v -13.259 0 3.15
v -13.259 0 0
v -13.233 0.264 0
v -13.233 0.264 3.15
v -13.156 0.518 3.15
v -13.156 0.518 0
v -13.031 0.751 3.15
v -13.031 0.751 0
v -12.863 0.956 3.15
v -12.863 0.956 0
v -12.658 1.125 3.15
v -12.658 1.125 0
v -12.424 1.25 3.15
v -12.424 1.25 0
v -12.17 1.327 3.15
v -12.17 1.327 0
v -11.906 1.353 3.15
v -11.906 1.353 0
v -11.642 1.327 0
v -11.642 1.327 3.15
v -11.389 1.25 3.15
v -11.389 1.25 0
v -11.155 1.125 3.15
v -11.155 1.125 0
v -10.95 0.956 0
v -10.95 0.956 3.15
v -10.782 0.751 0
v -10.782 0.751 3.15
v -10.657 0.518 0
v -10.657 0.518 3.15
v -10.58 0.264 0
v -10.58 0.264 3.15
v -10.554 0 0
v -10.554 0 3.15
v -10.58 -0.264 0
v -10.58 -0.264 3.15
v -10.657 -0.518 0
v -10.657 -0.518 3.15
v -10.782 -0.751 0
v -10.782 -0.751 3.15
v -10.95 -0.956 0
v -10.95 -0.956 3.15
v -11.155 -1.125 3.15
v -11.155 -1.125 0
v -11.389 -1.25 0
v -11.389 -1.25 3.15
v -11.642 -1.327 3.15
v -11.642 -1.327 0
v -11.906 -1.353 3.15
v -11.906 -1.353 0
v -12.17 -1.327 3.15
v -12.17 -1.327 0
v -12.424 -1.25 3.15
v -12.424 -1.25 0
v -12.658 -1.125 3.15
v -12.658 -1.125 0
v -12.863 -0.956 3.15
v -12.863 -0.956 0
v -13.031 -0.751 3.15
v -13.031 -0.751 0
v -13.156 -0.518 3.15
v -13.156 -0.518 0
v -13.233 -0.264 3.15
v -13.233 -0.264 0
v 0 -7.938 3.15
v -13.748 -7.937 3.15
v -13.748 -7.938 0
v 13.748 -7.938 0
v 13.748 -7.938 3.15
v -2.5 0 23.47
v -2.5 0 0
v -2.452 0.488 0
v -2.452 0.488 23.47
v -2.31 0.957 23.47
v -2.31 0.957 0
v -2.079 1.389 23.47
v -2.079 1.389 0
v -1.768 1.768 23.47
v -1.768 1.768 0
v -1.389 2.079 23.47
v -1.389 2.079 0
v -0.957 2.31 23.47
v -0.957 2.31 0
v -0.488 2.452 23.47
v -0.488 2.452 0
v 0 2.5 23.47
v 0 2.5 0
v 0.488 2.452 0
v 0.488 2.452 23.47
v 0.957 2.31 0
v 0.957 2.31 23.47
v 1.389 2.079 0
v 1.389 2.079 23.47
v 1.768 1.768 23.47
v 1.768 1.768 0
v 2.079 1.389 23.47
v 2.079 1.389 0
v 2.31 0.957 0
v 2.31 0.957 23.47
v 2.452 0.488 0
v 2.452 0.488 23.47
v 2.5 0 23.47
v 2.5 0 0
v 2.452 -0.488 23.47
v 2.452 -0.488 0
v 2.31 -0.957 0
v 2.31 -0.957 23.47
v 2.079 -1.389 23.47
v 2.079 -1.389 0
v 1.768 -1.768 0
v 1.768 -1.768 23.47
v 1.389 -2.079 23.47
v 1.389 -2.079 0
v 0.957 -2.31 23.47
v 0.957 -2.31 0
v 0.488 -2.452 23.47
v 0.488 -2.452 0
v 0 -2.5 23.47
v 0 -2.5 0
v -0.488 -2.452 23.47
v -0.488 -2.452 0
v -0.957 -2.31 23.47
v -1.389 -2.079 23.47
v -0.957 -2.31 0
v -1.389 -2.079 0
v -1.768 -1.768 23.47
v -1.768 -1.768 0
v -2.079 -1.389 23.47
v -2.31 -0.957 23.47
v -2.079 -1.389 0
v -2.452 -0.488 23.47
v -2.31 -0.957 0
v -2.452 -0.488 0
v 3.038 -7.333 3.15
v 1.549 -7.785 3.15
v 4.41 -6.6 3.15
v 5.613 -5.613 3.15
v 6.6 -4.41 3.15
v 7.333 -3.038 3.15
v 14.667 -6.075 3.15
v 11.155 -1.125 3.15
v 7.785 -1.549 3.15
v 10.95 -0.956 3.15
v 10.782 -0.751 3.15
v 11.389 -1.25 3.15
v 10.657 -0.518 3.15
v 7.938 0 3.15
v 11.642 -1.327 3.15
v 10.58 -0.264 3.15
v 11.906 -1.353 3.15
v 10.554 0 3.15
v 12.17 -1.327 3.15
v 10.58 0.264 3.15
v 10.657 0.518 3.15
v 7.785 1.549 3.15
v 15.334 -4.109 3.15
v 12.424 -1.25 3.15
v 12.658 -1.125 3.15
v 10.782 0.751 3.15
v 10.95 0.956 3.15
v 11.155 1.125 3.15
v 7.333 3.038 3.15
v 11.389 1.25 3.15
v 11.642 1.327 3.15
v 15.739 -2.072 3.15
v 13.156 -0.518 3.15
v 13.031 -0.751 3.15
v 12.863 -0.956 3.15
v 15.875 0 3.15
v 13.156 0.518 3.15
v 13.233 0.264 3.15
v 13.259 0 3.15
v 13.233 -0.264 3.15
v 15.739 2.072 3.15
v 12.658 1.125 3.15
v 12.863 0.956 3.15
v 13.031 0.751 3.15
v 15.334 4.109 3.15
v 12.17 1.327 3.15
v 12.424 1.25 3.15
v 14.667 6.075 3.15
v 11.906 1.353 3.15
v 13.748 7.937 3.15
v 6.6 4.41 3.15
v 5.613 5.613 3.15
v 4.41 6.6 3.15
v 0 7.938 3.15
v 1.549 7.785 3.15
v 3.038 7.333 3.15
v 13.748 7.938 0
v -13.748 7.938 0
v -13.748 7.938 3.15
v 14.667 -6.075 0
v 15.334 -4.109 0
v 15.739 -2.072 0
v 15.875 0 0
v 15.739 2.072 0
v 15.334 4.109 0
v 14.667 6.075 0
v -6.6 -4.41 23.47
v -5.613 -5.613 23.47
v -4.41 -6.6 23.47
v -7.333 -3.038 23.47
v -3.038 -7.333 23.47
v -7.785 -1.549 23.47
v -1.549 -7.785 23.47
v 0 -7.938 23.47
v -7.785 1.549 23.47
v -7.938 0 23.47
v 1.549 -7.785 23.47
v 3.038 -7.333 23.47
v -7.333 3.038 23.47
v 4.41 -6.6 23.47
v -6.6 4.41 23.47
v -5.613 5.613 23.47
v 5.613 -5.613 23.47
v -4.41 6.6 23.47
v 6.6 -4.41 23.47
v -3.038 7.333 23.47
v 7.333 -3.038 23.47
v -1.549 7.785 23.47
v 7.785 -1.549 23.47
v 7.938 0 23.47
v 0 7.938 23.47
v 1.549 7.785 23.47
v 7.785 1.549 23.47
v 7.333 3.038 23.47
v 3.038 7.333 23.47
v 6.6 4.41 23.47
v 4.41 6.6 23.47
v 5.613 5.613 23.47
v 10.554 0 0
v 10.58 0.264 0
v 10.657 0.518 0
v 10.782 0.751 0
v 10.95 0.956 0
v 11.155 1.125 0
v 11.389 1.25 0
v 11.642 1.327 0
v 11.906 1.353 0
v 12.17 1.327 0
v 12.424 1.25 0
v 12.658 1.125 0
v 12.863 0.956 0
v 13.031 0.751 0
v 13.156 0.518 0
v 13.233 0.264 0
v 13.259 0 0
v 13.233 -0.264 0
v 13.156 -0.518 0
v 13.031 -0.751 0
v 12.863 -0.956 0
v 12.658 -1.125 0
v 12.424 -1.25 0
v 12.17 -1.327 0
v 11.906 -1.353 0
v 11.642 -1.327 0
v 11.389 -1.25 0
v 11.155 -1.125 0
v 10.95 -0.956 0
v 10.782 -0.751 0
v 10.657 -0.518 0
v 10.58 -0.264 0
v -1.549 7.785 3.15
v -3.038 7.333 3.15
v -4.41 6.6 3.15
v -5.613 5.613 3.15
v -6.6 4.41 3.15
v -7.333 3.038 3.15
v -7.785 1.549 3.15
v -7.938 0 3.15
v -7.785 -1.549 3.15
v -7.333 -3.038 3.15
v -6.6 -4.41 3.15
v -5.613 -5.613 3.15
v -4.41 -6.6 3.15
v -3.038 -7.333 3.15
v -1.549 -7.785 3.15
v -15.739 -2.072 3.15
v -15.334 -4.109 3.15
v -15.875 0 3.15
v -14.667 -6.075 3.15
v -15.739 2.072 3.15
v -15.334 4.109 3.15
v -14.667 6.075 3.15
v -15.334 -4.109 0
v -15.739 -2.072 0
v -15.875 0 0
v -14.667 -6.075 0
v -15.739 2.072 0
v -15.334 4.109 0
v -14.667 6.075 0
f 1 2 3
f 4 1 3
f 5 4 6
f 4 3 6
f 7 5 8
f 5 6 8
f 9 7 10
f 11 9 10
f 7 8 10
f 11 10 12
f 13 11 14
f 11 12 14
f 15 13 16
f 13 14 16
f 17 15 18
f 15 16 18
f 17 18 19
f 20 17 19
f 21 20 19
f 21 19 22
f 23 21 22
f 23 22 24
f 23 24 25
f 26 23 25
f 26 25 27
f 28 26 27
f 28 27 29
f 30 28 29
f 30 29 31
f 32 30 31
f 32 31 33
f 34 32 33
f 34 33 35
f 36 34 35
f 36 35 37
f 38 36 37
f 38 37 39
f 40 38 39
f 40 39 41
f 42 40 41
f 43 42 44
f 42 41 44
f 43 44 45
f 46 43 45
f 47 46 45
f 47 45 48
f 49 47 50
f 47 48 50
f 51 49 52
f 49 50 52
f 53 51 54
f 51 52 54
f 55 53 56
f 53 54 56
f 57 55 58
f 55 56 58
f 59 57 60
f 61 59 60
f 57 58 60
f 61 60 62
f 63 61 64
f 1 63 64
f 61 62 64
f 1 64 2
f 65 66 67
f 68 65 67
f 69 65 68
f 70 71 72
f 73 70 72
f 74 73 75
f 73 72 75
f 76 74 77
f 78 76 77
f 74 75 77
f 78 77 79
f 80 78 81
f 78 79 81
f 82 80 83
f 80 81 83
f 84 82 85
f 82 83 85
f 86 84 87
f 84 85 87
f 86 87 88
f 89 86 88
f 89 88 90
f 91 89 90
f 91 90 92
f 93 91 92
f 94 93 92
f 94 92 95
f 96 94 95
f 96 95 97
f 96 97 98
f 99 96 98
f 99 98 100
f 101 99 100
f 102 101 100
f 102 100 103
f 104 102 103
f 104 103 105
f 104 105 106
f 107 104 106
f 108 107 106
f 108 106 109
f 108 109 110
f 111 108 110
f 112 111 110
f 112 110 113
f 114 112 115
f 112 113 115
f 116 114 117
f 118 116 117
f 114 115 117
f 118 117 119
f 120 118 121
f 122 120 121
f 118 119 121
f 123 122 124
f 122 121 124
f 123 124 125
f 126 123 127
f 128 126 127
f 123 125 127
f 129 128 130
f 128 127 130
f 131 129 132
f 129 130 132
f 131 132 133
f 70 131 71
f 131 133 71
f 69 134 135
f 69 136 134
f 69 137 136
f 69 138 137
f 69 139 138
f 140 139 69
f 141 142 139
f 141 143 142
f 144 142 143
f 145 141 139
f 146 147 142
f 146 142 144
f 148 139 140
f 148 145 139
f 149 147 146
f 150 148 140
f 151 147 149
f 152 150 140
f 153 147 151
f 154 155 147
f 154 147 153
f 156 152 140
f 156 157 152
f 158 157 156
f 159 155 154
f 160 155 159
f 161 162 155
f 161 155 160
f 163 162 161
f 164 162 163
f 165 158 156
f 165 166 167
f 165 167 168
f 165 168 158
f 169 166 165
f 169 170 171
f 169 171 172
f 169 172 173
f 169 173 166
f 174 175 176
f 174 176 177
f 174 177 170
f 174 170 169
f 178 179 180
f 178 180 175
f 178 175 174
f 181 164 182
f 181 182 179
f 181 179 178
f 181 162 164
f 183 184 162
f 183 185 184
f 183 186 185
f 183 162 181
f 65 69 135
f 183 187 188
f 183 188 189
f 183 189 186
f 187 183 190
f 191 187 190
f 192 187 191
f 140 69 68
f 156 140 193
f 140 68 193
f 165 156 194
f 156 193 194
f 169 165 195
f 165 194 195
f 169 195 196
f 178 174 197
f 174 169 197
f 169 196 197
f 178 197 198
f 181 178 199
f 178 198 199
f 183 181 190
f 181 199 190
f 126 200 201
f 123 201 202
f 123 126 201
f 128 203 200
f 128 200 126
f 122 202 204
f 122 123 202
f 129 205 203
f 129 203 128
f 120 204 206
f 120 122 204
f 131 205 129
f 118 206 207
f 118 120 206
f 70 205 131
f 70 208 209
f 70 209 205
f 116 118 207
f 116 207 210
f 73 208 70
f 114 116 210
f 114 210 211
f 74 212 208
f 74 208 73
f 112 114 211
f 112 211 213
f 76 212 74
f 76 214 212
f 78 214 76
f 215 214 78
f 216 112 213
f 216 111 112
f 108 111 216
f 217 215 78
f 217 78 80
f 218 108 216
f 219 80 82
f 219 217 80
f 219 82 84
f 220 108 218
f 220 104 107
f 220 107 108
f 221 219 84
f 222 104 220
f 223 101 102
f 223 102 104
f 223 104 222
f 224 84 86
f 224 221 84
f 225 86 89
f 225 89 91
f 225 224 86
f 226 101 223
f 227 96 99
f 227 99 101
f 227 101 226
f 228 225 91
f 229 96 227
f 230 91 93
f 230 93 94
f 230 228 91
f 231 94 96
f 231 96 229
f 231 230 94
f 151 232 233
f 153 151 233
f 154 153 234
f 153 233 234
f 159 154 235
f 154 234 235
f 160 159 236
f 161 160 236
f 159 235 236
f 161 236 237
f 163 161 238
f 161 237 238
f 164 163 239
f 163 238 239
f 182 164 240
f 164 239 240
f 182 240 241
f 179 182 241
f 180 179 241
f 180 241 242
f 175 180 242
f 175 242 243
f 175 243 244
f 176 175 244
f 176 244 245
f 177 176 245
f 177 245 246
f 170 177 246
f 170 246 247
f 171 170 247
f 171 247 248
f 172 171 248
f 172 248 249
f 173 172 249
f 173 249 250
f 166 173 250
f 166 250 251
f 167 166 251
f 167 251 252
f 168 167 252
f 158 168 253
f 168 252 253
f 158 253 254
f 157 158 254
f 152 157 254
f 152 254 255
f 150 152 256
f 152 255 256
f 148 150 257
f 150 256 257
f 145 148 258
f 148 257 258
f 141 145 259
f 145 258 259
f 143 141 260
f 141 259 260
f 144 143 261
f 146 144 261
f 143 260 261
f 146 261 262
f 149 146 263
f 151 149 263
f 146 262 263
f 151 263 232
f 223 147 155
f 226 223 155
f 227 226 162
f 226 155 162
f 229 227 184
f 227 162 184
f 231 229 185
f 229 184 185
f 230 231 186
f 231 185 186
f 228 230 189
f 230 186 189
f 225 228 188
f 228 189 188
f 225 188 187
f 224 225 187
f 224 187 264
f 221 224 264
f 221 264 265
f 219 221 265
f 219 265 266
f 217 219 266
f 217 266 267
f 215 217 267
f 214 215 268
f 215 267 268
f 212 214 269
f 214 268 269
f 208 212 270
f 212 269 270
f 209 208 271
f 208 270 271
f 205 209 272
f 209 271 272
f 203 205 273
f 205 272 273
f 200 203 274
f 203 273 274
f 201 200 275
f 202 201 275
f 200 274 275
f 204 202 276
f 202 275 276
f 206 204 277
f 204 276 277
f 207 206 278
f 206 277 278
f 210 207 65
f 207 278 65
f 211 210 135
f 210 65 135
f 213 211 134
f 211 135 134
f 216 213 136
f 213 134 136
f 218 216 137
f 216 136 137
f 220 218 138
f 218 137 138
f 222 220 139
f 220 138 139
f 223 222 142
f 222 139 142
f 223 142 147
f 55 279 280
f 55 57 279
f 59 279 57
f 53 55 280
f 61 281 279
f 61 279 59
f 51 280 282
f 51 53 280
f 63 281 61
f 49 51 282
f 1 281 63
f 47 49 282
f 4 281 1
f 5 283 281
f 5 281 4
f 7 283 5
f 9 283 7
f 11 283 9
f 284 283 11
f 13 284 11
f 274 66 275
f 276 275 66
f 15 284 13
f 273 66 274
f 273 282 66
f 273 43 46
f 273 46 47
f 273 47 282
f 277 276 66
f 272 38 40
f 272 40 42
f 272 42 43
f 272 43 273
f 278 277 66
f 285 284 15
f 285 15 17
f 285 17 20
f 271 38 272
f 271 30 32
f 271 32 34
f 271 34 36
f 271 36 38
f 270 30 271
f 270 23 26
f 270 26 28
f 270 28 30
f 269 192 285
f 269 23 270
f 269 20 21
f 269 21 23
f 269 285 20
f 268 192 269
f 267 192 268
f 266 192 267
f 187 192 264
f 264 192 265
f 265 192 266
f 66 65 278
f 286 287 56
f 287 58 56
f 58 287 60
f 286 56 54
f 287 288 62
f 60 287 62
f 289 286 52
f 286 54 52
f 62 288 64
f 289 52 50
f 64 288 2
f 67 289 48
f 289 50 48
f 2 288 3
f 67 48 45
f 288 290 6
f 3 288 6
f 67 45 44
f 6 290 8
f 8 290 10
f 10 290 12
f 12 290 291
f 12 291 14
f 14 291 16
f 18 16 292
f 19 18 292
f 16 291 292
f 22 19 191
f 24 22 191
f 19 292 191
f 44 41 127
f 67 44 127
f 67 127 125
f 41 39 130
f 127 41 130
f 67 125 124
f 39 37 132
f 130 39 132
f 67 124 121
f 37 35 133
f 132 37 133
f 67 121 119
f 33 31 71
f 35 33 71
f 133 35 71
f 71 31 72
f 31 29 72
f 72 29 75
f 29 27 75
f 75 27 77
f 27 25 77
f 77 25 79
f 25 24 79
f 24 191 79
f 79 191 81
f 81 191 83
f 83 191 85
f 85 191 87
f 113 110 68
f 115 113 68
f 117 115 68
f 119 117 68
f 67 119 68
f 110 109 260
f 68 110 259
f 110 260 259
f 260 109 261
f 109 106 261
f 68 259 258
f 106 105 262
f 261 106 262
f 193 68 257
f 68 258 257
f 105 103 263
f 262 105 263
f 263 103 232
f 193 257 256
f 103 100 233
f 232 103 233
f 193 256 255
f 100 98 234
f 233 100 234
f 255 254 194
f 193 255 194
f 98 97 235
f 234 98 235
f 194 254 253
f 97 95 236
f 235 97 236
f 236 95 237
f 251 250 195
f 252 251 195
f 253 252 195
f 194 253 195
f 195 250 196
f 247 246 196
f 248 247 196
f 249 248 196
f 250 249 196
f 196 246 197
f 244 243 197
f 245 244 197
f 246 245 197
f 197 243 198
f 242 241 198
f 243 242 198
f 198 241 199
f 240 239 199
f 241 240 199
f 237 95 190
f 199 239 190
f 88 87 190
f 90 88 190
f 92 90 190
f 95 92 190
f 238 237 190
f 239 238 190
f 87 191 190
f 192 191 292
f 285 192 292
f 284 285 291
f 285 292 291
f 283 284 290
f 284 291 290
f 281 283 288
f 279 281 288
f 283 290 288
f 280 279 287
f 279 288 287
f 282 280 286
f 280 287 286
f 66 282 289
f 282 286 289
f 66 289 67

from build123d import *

# Parameters (mm, degrees)
SKETCH1_R                        = 15.875
BOSS_EXTRUDE1_DEPTH              = 23.4696
CUT_EXTRUDE1_START               = -20.32
SKETCH2_R                        = 15.875
SKETCH2_R_2                      = 7.9375
CUT_EXTRUDE1_DEPTH               = 20.32
M6X1_0_TAPPED_HOLE1_D            = 5
F_36_0_1065_DIAMETER_HOLE2_D     = 2.7051
F_36_0_1065_DIAMETER_HOLE2_DEPTH = 6.35
F_36_0_1065_DIAMETER_HOLE2_TIP   = 0.81269403
CUT_EXTRUDE2_DEPTH               = 31.280912305


with BuildPart() as part:
    # Sketch1 → Boss-Extrude1 (new body)
    with BuildSketch(Plane.XY):
        Circle(SKETCH1_R)
    extrude(amount=BOSS_EXTRUDE1_DEPTH)

    # Sketch2 → Cut-Extrude1 (cut)
    with BuildSketch(Plane.XY.offset(23.4696).offset(CUT_EXTRUDE1_START)):
        Circle(SKETCH2_R)
        Circle(SKETCH2_R_2, mode=Mode.SUBTRACT)
    extrude(amount=CUT_EXTRUDE1_DEPTH, mode=Mode.SUBTRACT)

    # M6x1.0 Tapped Hole1 (through all)
    with Locations(Plane.XY.offset(23.4696)):
        with Locations((0, 0)):
            Hole(M6X1_0_TAPPED_HOLE1_D / 2)

    # #36 (0.1065) Diameter Hole2
    with Locations(Plane.XY.offset(3.1496)):
        with Locations((11.90625, 0), (-11.90625, 0)):
            Hole(F_36_0_1065_DIAMETER_HOLE2_D / 2, depth=F_36_0_1065_DIAMETER_HOLE2_DEPTH)
            with Locations((0, 0, -(F_36_0_1065_DIAMETER_HOLE2_DEPTH + F_36_0_1065_DIAMETER_HOLE2_TIP / 2))):  # 118° drill point
                Cone(0, F_36_0_1065_DIAMETER_HOLE2_D / 2, F_36_0_1065_DIAMETER_HOLE2_TIP, mode=Mode.SUBTRACT)

    # Sketch8 → Cut-Extrude2 (cut, through all)
    with BuildSketch(Plane.XY.offset(3.1496)):
        with BuildLine():
            Line((0, 7.9375), (-13.748153285, 7.9375))
            ThreePointArc((-13.748153285, 7.9375), (0, 15.875), (13.748153285, 7.9375))
            Line((13.748153285, 7.9375), (0, 7.9375))
        make_face()
        with BuildLine():
            Line((-13.748153285, -7.9375), (13.748153285, -7.9375))
            ThreePointArc((13.748153285, -7.9375), (0, -15.875), (-13.748153285, -7.9375))
        make_face()
    extrude(amount=-CUT_EXTRUDE2_DEPTH, mode=Mode.SUBTRACT)


solid = part.part
